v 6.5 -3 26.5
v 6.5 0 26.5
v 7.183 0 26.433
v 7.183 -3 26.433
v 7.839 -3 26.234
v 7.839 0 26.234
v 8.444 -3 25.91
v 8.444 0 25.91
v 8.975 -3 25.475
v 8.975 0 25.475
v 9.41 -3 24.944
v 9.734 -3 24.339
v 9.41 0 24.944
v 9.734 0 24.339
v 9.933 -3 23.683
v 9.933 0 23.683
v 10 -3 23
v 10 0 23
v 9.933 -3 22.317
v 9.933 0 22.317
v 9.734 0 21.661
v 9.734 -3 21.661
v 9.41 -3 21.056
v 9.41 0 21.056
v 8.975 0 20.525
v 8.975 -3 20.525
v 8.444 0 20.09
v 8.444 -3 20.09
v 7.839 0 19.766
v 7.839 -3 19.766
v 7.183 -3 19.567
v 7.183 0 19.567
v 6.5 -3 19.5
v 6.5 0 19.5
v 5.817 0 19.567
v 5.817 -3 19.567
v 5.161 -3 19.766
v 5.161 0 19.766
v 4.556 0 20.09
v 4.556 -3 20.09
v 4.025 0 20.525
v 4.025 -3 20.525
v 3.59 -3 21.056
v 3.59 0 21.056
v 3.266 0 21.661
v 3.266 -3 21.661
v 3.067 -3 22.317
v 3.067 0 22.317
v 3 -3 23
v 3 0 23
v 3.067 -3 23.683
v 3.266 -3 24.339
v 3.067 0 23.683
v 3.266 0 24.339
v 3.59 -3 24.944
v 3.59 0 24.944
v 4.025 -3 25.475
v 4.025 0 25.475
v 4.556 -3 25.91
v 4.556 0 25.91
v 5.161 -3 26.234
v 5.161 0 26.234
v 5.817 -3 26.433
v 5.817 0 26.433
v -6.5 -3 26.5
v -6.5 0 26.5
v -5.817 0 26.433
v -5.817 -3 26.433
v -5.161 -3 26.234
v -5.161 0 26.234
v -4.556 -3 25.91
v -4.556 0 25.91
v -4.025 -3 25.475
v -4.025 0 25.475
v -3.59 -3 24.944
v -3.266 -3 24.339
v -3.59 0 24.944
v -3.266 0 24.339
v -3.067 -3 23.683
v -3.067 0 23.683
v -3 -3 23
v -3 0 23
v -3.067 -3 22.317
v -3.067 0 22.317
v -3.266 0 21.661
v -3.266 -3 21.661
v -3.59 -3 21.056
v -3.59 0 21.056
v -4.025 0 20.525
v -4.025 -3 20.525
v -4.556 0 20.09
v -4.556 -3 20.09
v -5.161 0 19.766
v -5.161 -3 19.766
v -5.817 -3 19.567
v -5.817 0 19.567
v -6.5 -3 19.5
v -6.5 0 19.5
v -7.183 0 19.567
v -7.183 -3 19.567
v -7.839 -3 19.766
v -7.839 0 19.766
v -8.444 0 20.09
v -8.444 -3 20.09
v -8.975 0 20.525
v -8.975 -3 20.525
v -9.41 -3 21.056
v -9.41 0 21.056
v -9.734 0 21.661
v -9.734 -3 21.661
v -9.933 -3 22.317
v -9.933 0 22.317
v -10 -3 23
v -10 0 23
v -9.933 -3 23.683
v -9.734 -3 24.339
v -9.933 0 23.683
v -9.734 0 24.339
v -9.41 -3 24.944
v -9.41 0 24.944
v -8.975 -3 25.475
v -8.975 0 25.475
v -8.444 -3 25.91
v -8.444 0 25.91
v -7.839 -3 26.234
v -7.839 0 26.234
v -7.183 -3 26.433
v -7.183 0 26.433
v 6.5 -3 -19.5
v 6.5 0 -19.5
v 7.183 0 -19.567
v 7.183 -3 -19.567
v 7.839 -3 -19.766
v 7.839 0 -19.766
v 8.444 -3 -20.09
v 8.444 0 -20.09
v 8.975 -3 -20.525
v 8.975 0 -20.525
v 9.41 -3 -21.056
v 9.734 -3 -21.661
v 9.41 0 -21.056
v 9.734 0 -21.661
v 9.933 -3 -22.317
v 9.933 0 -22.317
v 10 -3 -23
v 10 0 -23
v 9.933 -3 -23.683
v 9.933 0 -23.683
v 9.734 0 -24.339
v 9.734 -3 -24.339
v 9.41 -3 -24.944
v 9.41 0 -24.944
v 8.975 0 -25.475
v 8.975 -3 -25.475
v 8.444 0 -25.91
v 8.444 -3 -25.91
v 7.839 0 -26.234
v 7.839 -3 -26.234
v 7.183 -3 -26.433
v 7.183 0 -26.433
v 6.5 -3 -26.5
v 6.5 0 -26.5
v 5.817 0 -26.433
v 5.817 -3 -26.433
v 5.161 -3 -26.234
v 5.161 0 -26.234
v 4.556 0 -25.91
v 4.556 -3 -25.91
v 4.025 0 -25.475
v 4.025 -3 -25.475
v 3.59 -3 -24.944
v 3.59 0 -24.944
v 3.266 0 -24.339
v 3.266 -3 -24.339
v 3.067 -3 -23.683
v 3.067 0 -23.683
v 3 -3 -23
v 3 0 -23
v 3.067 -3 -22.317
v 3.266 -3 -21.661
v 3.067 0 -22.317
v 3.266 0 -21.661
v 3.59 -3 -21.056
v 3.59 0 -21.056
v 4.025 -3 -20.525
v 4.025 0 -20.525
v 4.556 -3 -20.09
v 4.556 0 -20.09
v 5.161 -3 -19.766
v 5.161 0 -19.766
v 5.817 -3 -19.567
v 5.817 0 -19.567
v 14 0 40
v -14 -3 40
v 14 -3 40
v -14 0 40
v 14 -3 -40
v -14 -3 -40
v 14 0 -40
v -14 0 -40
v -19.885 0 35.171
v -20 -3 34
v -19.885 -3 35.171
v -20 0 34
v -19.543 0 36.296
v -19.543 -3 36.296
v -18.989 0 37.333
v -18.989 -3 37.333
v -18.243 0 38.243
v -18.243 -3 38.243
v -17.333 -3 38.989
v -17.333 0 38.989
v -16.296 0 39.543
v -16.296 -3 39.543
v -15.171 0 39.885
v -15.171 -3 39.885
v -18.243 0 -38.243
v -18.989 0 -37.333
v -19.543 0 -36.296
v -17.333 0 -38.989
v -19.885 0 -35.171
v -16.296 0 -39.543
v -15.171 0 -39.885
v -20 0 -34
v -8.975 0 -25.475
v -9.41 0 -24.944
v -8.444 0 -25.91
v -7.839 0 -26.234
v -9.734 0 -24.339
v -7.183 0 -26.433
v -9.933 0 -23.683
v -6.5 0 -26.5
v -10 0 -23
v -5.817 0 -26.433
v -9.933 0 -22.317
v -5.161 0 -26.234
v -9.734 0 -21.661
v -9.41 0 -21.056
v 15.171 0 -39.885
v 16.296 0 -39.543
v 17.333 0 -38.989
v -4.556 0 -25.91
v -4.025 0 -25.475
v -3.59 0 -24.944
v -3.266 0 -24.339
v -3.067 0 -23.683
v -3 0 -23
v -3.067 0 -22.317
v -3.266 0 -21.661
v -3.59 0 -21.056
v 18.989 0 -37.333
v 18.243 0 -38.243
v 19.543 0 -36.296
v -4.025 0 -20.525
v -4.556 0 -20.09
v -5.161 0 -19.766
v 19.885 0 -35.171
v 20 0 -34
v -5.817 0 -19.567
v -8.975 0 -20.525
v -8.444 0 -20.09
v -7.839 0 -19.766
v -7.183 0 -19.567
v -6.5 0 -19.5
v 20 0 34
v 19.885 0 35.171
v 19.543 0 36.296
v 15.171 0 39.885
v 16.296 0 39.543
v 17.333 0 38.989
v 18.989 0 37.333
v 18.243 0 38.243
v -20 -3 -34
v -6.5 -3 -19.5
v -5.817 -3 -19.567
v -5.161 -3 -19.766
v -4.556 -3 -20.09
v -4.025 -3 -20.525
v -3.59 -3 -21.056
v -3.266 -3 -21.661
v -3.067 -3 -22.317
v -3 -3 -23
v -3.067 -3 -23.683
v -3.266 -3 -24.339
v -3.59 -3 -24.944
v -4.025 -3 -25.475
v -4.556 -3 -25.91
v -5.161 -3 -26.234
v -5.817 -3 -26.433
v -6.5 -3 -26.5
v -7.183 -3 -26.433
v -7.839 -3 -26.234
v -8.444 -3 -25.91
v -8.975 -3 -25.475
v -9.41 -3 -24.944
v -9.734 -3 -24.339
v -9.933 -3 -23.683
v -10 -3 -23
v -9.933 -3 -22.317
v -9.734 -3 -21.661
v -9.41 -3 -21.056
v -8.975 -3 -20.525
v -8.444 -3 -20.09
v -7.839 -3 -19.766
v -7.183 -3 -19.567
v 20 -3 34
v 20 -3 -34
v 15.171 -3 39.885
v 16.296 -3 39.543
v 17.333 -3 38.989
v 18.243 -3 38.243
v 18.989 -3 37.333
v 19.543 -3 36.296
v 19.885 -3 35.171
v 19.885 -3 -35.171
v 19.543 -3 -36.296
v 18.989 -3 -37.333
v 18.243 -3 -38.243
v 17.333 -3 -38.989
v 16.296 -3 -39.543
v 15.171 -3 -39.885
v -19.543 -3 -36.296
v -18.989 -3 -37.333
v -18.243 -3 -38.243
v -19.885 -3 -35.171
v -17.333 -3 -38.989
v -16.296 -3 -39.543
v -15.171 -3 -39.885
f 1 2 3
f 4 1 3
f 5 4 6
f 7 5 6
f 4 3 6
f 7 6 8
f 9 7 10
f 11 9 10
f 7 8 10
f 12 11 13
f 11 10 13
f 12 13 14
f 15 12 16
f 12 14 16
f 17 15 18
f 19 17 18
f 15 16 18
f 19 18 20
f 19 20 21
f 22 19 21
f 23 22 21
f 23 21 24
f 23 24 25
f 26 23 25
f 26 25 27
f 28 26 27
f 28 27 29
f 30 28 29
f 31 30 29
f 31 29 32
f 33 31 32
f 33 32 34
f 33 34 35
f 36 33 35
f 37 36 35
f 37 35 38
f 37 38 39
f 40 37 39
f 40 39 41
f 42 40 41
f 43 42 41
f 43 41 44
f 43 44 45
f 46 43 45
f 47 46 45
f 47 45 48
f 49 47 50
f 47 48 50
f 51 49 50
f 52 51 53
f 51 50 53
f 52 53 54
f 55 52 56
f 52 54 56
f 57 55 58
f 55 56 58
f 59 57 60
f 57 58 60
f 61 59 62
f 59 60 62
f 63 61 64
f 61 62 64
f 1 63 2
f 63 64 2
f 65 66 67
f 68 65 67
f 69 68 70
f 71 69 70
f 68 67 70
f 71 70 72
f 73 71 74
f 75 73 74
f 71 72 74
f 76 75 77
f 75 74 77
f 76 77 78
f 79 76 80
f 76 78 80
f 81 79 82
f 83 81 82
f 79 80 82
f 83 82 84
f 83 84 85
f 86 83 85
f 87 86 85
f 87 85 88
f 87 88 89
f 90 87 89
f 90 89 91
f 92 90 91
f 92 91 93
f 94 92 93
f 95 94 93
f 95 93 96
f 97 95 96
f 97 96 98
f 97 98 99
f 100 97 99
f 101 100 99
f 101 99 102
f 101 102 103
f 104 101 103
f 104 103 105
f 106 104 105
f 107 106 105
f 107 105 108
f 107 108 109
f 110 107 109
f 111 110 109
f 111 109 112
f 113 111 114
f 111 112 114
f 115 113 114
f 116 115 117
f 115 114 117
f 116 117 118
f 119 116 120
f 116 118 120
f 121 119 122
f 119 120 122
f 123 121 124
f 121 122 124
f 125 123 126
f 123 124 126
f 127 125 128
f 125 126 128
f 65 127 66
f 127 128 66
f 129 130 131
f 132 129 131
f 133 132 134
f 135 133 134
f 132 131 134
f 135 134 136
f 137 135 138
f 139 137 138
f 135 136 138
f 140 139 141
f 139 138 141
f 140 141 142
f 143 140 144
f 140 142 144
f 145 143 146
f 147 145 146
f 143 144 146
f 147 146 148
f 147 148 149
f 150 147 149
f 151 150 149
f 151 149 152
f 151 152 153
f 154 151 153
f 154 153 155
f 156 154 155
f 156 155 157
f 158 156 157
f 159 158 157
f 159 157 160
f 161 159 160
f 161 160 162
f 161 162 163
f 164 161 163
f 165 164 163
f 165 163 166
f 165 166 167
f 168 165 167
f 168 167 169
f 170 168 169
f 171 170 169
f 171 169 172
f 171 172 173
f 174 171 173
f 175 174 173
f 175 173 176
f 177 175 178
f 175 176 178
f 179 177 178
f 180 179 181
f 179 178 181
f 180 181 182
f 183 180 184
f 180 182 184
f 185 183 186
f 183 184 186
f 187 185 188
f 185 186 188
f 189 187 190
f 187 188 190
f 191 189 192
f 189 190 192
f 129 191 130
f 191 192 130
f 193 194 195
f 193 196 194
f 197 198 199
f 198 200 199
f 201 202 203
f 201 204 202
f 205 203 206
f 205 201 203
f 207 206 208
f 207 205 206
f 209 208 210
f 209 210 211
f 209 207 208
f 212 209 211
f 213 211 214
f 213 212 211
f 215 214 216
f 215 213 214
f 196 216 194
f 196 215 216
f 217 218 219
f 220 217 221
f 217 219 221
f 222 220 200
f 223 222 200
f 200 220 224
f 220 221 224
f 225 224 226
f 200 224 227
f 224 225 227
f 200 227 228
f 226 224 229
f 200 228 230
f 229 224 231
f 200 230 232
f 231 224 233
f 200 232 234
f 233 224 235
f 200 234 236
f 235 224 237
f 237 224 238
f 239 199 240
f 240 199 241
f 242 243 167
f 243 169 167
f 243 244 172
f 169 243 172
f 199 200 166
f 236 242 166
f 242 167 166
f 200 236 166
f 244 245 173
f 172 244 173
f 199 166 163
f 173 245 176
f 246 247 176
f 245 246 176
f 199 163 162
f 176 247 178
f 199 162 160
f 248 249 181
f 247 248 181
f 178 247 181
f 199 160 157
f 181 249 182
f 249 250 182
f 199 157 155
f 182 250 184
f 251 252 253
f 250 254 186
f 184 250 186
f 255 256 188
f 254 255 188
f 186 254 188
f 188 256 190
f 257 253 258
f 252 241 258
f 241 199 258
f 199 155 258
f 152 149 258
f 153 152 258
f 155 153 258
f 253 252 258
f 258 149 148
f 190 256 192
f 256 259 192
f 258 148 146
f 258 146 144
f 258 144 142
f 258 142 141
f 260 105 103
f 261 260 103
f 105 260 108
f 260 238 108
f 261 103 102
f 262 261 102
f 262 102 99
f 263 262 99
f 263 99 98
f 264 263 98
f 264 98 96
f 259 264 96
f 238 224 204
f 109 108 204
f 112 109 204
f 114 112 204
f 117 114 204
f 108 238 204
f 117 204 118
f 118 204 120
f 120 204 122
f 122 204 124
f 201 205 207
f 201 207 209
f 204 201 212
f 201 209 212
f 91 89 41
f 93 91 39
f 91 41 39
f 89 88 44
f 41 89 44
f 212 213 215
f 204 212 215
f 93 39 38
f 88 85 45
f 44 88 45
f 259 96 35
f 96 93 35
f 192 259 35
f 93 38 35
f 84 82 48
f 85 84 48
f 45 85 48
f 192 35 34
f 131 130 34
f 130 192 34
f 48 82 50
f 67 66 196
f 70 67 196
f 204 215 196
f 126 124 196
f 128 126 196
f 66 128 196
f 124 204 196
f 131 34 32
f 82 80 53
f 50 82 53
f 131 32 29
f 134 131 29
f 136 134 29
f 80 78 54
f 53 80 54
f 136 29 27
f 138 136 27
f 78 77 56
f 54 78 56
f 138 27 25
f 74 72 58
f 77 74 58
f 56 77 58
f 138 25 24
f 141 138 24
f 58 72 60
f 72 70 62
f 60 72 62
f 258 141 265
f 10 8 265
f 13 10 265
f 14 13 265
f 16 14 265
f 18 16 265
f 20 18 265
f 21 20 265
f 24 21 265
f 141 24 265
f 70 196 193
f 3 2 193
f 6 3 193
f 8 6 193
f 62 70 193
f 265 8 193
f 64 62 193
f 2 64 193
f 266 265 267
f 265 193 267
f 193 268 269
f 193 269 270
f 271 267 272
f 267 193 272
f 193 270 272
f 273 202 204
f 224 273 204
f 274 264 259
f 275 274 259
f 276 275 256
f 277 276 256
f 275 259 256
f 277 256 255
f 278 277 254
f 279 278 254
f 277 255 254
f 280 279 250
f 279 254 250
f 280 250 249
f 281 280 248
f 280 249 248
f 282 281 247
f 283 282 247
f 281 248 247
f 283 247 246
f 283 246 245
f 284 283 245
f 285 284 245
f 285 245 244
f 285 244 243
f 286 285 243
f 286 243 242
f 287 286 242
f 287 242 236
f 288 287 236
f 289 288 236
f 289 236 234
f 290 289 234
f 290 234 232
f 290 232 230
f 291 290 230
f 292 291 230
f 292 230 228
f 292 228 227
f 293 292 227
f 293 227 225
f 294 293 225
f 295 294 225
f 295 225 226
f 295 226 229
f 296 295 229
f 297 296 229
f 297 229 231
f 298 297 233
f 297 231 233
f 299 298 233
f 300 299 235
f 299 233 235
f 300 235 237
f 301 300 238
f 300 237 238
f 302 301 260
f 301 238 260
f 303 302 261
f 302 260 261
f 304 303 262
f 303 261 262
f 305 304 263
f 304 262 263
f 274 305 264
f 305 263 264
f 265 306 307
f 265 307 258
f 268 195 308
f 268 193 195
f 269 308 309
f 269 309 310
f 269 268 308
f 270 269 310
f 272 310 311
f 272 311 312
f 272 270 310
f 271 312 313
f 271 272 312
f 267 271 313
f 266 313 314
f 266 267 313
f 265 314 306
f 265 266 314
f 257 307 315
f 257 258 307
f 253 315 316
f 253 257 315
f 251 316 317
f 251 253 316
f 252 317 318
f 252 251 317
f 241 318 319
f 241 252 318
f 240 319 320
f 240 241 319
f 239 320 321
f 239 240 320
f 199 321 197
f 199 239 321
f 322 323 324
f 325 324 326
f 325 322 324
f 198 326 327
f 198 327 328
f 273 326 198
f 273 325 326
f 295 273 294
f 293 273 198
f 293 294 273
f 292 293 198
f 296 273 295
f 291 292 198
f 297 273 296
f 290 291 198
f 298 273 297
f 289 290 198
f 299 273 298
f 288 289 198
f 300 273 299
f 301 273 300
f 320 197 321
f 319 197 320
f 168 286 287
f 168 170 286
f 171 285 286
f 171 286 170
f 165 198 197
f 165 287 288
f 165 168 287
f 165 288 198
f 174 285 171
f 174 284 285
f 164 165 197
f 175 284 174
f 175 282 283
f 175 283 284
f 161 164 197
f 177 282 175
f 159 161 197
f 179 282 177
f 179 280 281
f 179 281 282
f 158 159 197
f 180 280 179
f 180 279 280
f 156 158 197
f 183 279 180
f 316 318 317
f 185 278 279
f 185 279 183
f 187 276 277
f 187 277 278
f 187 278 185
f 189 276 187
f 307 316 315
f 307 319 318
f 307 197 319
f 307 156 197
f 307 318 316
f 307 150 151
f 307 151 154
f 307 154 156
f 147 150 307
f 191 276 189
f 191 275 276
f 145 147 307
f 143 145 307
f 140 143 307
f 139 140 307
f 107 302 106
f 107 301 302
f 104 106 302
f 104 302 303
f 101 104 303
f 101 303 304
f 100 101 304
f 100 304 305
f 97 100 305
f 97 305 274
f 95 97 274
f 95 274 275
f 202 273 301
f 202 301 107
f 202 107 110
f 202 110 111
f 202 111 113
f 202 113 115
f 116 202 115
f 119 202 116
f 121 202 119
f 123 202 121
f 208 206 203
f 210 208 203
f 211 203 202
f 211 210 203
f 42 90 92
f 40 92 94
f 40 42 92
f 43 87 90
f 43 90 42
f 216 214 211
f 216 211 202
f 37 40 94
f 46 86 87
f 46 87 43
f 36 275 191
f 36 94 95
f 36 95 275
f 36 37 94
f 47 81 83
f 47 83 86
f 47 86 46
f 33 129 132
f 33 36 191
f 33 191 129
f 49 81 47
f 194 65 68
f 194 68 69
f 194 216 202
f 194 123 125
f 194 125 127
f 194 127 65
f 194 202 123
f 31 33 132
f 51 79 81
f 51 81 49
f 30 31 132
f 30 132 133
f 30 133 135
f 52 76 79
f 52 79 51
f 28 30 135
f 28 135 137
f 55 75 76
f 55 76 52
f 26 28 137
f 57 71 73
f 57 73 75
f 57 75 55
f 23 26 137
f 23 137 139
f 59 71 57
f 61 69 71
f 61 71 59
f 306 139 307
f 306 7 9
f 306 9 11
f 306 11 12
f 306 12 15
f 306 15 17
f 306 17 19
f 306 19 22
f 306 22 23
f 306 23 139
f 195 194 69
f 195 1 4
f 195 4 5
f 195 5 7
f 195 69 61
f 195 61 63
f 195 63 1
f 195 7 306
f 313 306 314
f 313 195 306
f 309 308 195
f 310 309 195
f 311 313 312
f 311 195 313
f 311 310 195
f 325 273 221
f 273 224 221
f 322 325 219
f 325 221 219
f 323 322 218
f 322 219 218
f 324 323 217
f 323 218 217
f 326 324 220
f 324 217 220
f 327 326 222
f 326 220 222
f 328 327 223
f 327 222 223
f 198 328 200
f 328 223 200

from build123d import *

# Parameters (mm, degrees)
SKIZZE1_W                       = 40
SKIZZE1_H                       = 3
AUFSATZ_LINEAR_AUSTRAGEN1_DEPTH = 40
VERRUNDUNG1_R                   = 6
SKIZZE2_R                       = 3.5
SCHNITT_LINEAR_AUSTRAGEN1_DEPTH = 10


with BuildPart() as part:
    # Skizze1 → Aufsatz-Linear austragen1 (new, symmetric)
    with BuildSketch(Plane.XY):
        with Locations((0, -1.5)):
            Rectangle(SKIZZE1_W, SKIZZE1_H)
    extrude(amount=AUFSATZ_LINEAR_AUSTRAGEN1_DEPTH, both=True)

    # Verrundung1
    verrundung1_edges = [part.edges().sort_by_distance(p)[0] for p in [
        (20, -1.5, 40),
        (-20, -1.5, 40),
        (20, -1.5, -40),
        (-20, -1.5, -40),
    ]]
    fillet(verrundung1_edges, radius=VERRUNDUNG1_R)

    # Skizze2 → Schnitt-Linear austragen1 (cut)
    with BuildSketch(Plane(origin=(0, 0, 0), x_dir=(1, 0, 0), z_dir=(0, 1, 0))):
        with Locations(Location((6.5, 23, 0), (0, 0, 270))):
            Circle(SKIZZE2_R)
        with Locations(Location((-6.5, 23, 0), (0, 0, 270))):
            Circle(SKIZZE2_R)
        with Locations(Location((6.5, -23, 0), (0, 0, 270))):
            Circle(SKIZZE2_R)
        with Locations(Location((-6.5, -23, 0), (0, 0, 270))):
            Circle(SKIZZE2_R)
    extrude(amount=-SCHNITT_LINEAR_AUSTRAGEN1_DEPTH, mode=Mode.SUBTRACT)


solid = part.part
